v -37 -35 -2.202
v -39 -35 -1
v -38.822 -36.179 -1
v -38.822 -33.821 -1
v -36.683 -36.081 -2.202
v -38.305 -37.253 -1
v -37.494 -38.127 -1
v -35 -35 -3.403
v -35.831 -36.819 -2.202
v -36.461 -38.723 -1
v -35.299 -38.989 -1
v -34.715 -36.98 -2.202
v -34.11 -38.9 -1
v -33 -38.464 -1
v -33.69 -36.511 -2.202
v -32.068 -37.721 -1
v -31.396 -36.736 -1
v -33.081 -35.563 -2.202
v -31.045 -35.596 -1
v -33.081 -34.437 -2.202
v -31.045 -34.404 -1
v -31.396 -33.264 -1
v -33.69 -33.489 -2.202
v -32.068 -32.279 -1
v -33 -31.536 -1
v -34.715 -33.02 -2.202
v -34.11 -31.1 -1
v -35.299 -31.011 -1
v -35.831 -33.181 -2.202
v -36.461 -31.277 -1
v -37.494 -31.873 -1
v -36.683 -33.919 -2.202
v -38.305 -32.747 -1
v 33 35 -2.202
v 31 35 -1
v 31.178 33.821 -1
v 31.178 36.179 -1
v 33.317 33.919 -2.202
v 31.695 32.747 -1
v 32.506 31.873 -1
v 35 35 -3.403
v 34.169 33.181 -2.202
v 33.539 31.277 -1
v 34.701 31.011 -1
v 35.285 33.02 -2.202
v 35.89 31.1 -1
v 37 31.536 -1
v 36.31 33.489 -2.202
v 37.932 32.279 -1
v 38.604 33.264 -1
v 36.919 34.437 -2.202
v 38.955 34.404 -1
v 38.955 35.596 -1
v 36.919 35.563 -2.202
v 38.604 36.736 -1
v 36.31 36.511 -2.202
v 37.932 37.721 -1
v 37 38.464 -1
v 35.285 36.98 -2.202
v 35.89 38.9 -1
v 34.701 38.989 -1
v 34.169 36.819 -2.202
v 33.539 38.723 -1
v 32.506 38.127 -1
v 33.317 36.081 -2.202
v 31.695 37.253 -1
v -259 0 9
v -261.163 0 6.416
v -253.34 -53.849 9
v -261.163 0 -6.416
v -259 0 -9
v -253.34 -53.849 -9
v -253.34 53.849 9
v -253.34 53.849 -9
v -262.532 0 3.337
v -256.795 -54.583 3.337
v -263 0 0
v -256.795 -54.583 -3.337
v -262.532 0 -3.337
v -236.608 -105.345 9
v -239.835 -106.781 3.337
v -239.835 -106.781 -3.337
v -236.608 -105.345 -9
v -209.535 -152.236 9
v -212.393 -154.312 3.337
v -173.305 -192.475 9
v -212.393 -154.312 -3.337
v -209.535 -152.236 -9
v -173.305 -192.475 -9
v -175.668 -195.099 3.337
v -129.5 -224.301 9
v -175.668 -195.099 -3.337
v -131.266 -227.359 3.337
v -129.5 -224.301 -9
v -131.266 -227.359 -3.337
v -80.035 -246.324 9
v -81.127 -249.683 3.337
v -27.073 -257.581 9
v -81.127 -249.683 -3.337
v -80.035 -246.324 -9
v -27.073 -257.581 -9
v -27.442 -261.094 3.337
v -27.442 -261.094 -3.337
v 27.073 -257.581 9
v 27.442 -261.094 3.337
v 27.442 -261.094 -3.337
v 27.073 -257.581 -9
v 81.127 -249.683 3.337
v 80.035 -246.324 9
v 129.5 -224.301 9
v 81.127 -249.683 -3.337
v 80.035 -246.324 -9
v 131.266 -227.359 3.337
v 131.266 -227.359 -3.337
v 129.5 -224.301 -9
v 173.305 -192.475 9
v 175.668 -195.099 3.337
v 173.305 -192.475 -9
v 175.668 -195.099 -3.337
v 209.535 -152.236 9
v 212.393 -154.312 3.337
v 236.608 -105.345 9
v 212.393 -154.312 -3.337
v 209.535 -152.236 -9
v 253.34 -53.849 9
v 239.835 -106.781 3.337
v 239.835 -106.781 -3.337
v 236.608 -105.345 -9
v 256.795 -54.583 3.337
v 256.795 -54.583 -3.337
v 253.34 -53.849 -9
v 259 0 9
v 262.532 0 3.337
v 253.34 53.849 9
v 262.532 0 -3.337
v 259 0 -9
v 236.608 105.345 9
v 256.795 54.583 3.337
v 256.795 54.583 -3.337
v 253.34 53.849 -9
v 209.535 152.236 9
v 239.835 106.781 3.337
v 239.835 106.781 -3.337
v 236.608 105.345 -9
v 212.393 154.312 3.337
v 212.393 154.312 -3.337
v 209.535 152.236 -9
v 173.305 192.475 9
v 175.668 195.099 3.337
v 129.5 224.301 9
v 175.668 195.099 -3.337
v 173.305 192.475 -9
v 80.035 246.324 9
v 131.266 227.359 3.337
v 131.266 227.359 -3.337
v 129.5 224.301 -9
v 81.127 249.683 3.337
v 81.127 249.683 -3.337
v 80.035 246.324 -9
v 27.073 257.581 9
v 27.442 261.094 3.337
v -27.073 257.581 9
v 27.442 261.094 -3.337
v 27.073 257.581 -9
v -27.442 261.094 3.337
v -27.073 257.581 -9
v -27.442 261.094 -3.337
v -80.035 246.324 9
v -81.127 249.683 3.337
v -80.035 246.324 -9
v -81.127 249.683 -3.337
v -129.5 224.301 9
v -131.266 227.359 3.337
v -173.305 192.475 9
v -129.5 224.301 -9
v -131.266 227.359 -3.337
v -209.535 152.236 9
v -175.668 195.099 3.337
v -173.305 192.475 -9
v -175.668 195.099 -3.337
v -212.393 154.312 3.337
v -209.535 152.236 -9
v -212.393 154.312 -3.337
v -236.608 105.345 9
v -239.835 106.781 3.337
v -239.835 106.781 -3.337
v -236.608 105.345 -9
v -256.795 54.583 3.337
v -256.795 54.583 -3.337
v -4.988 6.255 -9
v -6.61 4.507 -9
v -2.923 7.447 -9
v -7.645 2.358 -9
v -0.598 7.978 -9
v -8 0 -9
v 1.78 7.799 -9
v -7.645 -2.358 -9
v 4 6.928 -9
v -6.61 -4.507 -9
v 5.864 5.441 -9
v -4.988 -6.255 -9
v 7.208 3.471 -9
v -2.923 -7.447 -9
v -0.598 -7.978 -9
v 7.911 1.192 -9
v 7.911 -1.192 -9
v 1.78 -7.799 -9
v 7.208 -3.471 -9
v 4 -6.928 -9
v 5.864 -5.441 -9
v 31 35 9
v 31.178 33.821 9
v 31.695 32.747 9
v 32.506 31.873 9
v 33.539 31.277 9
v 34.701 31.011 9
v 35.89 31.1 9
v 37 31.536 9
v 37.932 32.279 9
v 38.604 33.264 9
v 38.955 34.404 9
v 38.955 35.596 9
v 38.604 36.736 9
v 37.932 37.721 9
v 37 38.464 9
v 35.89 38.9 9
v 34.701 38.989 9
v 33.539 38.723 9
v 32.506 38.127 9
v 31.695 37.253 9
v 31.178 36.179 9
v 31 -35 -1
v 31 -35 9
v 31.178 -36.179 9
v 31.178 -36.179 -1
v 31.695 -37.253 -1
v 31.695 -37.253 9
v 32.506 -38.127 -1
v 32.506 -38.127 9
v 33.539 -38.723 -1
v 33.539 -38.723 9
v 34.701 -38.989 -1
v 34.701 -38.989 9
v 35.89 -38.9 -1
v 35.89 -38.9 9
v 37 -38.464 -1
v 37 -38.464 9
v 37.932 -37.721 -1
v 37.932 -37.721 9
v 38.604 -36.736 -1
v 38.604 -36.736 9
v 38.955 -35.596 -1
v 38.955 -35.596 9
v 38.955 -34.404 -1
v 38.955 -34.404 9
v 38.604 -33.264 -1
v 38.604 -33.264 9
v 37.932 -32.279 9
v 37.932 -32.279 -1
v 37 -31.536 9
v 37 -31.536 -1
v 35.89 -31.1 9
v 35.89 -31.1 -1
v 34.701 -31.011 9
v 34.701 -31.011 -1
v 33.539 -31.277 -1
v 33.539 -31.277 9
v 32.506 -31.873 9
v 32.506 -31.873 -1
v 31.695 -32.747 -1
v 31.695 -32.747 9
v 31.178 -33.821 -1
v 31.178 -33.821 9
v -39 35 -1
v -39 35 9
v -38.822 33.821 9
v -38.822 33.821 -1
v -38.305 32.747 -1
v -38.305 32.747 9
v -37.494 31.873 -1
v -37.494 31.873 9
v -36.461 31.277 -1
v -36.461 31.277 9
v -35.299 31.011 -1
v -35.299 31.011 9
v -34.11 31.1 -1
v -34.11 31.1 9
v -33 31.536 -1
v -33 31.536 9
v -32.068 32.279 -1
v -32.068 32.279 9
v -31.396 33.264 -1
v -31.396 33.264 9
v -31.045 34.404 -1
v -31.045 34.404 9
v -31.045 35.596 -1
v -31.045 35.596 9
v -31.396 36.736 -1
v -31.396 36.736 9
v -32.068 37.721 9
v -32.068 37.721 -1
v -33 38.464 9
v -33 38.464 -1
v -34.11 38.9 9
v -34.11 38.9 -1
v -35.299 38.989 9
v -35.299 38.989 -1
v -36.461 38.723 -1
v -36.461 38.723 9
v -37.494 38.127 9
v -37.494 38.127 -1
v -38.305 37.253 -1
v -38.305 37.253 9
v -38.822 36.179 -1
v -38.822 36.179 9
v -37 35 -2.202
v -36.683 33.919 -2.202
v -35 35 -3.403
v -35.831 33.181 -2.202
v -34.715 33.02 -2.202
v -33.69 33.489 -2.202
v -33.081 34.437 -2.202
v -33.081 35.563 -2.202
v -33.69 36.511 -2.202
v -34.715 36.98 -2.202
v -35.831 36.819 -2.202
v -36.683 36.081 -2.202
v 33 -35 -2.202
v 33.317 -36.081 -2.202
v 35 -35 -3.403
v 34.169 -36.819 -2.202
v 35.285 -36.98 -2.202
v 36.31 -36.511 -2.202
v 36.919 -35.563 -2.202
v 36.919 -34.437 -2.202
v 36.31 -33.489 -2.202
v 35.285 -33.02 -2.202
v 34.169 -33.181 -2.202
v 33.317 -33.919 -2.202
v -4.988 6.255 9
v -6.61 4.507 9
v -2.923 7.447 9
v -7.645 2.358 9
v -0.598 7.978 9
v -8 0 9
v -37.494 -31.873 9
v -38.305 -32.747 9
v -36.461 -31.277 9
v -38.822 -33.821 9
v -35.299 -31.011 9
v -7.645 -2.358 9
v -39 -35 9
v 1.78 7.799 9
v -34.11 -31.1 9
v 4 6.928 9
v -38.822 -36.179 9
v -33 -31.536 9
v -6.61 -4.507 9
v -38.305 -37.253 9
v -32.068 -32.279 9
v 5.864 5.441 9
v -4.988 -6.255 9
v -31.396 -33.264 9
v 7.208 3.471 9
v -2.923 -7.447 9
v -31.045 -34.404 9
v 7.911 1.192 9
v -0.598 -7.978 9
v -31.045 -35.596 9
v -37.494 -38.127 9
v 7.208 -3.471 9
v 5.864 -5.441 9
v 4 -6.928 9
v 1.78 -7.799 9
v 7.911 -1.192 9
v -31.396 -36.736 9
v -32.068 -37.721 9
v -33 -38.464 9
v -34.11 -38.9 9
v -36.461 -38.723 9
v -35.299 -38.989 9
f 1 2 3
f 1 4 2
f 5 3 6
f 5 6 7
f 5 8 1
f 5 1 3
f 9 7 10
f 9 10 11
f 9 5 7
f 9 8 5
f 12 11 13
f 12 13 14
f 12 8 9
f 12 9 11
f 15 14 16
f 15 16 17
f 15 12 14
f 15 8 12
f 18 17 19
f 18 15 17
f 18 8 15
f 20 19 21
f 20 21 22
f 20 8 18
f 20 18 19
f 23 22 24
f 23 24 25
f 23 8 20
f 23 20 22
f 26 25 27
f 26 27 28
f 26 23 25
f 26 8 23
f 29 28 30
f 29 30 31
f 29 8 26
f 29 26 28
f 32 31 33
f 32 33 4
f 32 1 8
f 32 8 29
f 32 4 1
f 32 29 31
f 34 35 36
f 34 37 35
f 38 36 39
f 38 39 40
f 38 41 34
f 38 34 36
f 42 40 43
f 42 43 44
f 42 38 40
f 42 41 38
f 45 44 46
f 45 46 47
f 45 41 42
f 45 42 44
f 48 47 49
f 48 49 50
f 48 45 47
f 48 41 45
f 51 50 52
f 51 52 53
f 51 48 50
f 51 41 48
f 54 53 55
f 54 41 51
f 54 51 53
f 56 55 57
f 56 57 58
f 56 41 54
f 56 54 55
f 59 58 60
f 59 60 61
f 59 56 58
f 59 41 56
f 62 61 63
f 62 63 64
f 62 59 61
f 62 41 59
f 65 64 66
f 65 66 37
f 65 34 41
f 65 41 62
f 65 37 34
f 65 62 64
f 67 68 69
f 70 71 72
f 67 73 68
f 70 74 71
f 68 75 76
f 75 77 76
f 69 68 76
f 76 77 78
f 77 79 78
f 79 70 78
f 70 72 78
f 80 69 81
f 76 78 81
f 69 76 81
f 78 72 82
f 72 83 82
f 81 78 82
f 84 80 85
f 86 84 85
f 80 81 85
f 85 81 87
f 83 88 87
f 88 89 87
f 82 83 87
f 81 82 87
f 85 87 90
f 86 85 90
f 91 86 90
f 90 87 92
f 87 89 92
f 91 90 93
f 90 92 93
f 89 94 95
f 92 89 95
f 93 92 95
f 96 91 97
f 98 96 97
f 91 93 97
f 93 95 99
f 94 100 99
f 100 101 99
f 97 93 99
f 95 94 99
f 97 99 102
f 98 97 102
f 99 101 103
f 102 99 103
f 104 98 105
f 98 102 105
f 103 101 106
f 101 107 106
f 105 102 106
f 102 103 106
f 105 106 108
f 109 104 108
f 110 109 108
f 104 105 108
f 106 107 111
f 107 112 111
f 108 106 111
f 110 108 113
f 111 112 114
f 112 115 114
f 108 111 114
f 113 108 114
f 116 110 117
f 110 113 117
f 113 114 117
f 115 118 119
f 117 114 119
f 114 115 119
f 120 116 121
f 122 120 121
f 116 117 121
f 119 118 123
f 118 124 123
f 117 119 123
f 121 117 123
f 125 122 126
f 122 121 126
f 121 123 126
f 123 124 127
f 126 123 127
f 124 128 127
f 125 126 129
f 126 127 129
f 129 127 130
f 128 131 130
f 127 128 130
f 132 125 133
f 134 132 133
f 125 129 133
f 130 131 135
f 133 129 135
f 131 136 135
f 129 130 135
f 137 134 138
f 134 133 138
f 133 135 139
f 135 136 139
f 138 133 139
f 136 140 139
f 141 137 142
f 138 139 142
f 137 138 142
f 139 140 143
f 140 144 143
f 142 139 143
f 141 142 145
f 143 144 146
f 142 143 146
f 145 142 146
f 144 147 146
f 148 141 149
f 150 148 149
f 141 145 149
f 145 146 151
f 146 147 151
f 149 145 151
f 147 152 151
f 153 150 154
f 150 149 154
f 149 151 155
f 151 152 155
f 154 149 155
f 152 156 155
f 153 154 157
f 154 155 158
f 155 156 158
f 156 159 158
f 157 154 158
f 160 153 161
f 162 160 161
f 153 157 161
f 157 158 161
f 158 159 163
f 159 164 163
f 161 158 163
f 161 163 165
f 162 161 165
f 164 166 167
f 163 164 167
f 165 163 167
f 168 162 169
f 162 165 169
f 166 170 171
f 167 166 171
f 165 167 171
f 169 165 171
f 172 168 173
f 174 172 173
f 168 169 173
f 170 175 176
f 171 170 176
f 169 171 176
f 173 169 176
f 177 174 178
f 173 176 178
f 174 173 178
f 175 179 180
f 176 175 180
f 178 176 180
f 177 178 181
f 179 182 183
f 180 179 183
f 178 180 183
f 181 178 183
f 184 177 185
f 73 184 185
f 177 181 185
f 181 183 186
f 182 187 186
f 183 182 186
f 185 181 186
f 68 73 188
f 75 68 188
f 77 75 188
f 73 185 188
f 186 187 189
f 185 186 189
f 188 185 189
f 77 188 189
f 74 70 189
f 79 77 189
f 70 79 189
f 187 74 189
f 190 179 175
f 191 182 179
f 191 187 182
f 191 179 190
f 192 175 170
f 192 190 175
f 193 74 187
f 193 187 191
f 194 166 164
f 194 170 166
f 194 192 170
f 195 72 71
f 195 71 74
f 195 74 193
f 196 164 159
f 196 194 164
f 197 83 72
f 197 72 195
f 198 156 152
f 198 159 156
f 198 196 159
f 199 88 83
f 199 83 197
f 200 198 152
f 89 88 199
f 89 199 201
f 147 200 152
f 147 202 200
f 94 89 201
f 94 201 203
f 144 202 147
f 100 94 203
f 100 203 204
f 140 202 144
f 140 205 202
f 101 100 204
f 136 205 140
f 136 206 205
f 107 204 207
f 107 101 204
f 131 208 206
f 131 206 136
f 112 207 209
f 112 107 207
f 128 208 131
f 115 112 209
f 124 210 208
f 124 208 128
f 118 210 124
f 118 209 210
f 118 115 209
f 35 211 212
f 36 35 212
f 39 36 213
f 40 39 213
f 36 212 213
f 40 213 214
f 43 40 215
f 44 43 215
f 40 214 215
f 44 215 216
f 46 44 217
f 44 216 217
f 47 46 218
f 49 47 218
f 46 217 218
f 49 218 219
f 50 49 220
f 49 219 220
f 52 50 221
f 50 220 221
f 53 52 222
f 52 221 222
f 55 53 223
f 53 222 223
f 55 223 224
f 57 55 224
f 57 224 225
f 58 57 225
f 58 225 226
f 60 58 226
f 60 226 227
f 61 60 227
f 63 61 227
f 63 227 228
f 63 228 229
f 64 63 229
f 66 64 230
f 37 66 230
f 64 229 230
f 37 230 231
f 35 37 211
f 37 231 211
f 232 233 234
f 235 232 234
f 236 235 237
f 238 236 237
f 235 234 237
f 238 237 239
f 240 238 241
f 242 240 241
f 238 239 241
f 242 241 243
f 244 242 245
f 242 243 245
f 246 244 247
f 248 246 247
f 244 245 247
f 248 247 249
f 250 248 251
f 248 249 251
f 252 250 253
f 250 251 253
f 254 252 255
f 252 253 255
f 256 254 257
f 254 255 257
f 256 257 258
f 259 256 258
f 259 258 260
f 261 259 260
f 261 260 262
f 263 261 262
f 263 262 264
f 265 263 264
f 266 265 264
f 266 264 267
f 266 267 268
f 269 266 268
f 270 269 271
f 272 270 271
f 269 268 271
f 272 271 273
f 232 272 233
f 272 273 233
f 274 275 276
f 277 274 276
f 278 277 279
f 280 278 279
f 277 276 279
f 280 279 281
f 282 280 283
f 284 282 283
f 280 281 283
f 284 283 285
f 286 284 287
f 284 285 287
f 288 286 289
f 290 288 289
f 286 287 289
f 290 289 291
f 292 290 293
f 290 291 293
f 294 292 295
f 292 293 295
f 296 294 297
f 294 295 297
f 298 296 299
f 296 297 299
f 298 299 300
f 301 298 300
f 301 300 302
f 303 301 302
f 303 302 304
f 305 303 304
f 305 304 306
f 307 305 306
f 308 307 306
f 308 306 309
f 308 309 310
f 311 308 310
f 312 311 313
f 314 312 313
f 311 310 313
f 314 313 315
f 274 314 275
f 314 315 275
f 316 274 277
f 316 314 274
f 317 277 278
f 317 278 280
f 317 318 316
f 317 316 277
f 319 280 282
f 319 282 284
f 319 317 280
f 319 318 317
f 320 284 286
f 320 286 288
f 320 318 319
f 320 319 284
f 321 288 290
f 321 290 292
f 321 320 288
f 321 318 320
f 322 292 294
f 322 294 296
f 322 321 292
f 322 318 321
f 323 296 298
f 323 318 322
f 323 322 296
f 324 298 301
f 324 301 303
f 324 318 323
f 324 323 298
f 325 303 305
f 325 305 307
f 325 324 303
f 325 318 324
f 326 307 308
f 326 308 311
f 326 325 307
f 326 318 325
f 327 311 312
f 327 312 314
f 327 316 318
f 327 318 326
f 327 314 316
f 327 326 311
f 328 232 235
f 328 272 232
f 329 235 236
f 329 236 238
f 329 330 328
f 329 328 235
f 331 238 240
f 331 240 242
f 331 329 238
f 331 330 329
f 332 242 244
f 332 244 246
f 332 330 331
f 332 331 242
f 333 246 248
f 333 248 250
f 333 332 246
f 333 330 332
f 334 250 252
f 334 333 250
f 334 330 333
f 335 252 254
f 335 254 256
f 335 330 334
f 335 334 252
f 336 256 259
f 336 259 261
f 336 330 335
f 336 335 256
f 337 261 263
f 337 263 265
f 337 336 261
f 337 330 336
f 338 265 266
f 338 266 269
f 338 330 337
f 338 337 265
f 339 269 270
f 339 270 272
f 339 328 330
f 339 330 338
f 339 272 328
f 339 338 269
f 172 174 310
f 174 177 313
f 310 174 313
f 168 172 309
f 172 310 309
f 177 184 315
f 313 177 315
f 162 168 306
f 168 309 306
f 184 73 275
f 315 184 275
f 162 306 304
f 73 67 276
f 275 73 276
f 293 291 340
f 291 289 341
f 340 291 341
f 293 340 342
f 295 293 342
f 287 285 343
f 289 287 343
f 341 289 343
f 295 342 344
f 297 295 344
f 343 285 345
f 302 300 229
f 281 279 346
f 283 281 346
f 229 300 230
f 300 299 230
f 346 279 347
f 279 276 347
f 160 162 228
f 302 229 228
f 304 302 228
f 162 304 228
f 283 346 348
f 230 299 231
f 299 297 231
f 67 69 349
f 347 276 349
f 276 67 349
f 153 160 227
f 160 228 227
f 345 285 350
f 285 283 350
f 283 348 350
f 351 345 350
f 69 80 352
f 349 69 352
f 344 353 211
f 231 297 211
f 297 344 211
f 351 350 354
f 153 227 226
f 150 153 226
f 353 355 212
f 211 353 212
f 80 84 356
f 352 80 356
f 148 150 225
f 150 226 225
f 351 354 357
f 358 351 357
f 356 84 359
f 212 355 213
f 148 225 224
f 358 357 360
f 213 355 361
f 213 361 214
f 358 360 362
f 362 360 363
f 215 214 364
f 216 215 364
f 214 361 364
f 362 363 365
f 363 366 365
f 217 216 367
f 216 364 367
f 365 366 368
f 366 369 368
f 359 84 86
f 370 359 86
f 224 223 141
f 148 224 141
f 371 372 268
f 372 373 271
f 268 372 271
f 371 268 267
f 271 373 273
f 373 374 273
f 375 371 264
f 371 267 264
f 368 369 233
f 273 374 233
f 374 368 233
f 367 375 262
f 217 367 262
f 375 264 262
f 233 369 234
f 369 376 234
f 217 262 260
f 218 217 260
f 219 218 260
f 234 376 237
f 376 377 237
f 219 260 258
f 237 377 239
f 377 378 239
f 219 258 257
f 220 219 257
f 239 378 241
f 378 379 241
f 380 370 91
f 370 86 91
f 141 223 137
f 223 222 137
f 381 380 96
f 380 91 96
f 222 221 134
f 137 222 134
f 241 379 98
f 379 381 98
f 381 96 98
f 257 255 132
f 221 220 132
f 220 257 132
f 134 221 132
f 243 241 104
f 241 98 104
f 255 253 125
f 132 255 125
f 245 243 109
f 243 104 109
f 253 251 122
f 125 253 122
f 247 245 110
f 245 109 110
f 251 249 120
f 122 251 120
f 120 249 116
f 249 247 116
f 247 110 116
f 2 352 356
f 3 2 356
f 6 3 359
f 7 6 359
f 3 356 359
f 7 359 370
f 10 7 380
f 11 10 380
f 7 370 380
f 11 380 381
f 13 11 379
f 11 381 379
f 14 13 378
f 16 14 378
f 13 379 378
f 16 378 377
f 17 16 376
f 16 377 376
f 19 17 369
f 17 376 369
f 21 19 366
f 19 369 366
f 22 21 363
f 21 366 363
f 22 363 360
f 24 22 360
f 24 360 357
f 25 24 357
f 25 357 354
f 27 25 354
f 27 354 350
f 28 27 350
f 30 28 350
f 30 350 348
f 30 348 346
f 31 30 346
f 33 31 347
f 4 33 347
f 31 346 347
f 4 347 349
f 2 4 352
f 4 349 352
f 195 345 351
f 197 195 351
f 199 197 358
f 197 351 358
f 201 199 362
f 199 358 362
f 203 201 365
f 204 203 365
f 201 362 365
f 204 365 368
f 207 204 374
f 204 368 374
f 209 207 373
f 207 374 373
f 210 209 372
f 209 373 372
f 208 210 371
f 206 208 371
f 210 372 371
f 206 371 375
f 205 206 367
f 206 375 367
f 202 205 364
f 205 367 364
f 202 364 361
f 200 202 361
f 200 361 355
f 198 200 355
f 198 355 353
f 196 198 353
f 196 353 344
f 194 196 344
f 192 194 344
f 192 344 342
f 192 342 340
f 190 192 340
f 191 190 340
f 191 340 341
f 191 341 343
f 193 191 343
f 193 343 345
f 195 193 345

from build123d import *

# Parameters (mm, degrees)
SKETCH008_R    = 8
HOLE005_DEPTH  = 25
SKETCH009_R    = 4
HOLE006_DEPTH  = 10
HOLE006_TIPS_R = 4


with BuildPart() as part:
    # Sketch007 → Revolution001 (revolve)
    with BuildSketch(Plane.XZ):
        with BuildLine():
            Line((0, 9), (-259, 9))
            ThreePointArc((-259, 9), (-263, 0), (-259, -9))
            Line((0, -9), (-259, -9))
            Line((0, 9), (0, -9))
        make_face()
    revolve(axis=Axis((0, 0, 0), (0, 0, 1)))

    # Sketch008 (on Face1 of Revolution001) → Hole005 (cut)
    with BuildSketch(Plane(origin=(0, 0, 9), x_dir=(-1, 0, 0), z_dir=(0, 0, 1))):
        Circle(SKETCH008_R)
    extrude(amount=-HOLE005_DEPTH, mode=Mode.SUBTRACT)

    # Sketch009 (on Face1 of Hole005) → Hole006 (cut)
    with BuildSketch(Plane(origin=(0, 0, 9), x_dir=(-1, 0, 0), z_dir=(0, 0, 1))):
        with Locations((-35, 35)):
            Circle(SKETCH009_R)
        with Locations((35, 35)):
            Circle(SKETCH009_R)
        with Locations((-35, -35)):
            Circle(SKETCH009_R)
        with Locations((35, -35)):
            Circle(SKETCH009_R)
    extrude(amount=-HOLE006_DEPTH, mode=Mode.SUBTRACT)

    # Hole006 tips → Hole006 tip 1 section 0
    with BuildSketch(Plane(origin=(0, 0, -1), x_dir=(-1, 0, 0), z_dir=(0, 0, 1)), mode=Mode.PRIVATE) as hole006_tip_1_s0:
        with Locations((-35, 35)):
            Circle(HOLE006_TIPS_R)
    loft([hole006_tip_1_s0.sketch, Vertex(35, -35, -3.403442)], mode=Mode.SUBTRACT)

    # Hole006 tips → Hole006 tip 2 section 0
    with BuildSketch(Plane(origin=(0, 0, -1), x_dir=(-1, 0, 0), z_dir=(0, 0, 1)), mode=Mode.PRIVATE) as hole006_tip_2_s0:
        with Locations((35, 35)):
            Circle(HOLE006_TIPS_R)
    loft([hole006_tip_2_s0.sketch, Vertex(-35, -35, -3.403442)], mode=Mode.SUBTRACT)

    # Hole006 tips → Hole006 tip 3 section 0
    with BuildSketch(Plane(origin=(0, 0, -1), x_dir=(-1, 0, 0), z_dir=(0, 0, 1)), mode=Mode.PRIVATE) as hole006_tip_3_s0:
        with Locations((-35, -35)):
            Circle(HOLE006_TIPS_R)
    loft([hole006_tip_3_s0.sketch, Vertex(35, 35, -3.403442)], mode=Mode.SUBTRACT)

    # Hole006 tips → Hole006 tip 4 section 0
    with BuildSketch(Plane(origin=(0, 0, -1), x_dir=(-1, 0, 0), z_dir=(0, 0, 1)), mode=Mode.PRIVATE) as hole006_tip_4_s0:
        with Locations((35, -35)):
            Circle(HOLE006_TIPS_R)
    loft([hole006_tip_4_s0.sketch, Vertex(-35, 35, -3.403442)], mode=Mode.SUBTRACT)


solid = part.part
